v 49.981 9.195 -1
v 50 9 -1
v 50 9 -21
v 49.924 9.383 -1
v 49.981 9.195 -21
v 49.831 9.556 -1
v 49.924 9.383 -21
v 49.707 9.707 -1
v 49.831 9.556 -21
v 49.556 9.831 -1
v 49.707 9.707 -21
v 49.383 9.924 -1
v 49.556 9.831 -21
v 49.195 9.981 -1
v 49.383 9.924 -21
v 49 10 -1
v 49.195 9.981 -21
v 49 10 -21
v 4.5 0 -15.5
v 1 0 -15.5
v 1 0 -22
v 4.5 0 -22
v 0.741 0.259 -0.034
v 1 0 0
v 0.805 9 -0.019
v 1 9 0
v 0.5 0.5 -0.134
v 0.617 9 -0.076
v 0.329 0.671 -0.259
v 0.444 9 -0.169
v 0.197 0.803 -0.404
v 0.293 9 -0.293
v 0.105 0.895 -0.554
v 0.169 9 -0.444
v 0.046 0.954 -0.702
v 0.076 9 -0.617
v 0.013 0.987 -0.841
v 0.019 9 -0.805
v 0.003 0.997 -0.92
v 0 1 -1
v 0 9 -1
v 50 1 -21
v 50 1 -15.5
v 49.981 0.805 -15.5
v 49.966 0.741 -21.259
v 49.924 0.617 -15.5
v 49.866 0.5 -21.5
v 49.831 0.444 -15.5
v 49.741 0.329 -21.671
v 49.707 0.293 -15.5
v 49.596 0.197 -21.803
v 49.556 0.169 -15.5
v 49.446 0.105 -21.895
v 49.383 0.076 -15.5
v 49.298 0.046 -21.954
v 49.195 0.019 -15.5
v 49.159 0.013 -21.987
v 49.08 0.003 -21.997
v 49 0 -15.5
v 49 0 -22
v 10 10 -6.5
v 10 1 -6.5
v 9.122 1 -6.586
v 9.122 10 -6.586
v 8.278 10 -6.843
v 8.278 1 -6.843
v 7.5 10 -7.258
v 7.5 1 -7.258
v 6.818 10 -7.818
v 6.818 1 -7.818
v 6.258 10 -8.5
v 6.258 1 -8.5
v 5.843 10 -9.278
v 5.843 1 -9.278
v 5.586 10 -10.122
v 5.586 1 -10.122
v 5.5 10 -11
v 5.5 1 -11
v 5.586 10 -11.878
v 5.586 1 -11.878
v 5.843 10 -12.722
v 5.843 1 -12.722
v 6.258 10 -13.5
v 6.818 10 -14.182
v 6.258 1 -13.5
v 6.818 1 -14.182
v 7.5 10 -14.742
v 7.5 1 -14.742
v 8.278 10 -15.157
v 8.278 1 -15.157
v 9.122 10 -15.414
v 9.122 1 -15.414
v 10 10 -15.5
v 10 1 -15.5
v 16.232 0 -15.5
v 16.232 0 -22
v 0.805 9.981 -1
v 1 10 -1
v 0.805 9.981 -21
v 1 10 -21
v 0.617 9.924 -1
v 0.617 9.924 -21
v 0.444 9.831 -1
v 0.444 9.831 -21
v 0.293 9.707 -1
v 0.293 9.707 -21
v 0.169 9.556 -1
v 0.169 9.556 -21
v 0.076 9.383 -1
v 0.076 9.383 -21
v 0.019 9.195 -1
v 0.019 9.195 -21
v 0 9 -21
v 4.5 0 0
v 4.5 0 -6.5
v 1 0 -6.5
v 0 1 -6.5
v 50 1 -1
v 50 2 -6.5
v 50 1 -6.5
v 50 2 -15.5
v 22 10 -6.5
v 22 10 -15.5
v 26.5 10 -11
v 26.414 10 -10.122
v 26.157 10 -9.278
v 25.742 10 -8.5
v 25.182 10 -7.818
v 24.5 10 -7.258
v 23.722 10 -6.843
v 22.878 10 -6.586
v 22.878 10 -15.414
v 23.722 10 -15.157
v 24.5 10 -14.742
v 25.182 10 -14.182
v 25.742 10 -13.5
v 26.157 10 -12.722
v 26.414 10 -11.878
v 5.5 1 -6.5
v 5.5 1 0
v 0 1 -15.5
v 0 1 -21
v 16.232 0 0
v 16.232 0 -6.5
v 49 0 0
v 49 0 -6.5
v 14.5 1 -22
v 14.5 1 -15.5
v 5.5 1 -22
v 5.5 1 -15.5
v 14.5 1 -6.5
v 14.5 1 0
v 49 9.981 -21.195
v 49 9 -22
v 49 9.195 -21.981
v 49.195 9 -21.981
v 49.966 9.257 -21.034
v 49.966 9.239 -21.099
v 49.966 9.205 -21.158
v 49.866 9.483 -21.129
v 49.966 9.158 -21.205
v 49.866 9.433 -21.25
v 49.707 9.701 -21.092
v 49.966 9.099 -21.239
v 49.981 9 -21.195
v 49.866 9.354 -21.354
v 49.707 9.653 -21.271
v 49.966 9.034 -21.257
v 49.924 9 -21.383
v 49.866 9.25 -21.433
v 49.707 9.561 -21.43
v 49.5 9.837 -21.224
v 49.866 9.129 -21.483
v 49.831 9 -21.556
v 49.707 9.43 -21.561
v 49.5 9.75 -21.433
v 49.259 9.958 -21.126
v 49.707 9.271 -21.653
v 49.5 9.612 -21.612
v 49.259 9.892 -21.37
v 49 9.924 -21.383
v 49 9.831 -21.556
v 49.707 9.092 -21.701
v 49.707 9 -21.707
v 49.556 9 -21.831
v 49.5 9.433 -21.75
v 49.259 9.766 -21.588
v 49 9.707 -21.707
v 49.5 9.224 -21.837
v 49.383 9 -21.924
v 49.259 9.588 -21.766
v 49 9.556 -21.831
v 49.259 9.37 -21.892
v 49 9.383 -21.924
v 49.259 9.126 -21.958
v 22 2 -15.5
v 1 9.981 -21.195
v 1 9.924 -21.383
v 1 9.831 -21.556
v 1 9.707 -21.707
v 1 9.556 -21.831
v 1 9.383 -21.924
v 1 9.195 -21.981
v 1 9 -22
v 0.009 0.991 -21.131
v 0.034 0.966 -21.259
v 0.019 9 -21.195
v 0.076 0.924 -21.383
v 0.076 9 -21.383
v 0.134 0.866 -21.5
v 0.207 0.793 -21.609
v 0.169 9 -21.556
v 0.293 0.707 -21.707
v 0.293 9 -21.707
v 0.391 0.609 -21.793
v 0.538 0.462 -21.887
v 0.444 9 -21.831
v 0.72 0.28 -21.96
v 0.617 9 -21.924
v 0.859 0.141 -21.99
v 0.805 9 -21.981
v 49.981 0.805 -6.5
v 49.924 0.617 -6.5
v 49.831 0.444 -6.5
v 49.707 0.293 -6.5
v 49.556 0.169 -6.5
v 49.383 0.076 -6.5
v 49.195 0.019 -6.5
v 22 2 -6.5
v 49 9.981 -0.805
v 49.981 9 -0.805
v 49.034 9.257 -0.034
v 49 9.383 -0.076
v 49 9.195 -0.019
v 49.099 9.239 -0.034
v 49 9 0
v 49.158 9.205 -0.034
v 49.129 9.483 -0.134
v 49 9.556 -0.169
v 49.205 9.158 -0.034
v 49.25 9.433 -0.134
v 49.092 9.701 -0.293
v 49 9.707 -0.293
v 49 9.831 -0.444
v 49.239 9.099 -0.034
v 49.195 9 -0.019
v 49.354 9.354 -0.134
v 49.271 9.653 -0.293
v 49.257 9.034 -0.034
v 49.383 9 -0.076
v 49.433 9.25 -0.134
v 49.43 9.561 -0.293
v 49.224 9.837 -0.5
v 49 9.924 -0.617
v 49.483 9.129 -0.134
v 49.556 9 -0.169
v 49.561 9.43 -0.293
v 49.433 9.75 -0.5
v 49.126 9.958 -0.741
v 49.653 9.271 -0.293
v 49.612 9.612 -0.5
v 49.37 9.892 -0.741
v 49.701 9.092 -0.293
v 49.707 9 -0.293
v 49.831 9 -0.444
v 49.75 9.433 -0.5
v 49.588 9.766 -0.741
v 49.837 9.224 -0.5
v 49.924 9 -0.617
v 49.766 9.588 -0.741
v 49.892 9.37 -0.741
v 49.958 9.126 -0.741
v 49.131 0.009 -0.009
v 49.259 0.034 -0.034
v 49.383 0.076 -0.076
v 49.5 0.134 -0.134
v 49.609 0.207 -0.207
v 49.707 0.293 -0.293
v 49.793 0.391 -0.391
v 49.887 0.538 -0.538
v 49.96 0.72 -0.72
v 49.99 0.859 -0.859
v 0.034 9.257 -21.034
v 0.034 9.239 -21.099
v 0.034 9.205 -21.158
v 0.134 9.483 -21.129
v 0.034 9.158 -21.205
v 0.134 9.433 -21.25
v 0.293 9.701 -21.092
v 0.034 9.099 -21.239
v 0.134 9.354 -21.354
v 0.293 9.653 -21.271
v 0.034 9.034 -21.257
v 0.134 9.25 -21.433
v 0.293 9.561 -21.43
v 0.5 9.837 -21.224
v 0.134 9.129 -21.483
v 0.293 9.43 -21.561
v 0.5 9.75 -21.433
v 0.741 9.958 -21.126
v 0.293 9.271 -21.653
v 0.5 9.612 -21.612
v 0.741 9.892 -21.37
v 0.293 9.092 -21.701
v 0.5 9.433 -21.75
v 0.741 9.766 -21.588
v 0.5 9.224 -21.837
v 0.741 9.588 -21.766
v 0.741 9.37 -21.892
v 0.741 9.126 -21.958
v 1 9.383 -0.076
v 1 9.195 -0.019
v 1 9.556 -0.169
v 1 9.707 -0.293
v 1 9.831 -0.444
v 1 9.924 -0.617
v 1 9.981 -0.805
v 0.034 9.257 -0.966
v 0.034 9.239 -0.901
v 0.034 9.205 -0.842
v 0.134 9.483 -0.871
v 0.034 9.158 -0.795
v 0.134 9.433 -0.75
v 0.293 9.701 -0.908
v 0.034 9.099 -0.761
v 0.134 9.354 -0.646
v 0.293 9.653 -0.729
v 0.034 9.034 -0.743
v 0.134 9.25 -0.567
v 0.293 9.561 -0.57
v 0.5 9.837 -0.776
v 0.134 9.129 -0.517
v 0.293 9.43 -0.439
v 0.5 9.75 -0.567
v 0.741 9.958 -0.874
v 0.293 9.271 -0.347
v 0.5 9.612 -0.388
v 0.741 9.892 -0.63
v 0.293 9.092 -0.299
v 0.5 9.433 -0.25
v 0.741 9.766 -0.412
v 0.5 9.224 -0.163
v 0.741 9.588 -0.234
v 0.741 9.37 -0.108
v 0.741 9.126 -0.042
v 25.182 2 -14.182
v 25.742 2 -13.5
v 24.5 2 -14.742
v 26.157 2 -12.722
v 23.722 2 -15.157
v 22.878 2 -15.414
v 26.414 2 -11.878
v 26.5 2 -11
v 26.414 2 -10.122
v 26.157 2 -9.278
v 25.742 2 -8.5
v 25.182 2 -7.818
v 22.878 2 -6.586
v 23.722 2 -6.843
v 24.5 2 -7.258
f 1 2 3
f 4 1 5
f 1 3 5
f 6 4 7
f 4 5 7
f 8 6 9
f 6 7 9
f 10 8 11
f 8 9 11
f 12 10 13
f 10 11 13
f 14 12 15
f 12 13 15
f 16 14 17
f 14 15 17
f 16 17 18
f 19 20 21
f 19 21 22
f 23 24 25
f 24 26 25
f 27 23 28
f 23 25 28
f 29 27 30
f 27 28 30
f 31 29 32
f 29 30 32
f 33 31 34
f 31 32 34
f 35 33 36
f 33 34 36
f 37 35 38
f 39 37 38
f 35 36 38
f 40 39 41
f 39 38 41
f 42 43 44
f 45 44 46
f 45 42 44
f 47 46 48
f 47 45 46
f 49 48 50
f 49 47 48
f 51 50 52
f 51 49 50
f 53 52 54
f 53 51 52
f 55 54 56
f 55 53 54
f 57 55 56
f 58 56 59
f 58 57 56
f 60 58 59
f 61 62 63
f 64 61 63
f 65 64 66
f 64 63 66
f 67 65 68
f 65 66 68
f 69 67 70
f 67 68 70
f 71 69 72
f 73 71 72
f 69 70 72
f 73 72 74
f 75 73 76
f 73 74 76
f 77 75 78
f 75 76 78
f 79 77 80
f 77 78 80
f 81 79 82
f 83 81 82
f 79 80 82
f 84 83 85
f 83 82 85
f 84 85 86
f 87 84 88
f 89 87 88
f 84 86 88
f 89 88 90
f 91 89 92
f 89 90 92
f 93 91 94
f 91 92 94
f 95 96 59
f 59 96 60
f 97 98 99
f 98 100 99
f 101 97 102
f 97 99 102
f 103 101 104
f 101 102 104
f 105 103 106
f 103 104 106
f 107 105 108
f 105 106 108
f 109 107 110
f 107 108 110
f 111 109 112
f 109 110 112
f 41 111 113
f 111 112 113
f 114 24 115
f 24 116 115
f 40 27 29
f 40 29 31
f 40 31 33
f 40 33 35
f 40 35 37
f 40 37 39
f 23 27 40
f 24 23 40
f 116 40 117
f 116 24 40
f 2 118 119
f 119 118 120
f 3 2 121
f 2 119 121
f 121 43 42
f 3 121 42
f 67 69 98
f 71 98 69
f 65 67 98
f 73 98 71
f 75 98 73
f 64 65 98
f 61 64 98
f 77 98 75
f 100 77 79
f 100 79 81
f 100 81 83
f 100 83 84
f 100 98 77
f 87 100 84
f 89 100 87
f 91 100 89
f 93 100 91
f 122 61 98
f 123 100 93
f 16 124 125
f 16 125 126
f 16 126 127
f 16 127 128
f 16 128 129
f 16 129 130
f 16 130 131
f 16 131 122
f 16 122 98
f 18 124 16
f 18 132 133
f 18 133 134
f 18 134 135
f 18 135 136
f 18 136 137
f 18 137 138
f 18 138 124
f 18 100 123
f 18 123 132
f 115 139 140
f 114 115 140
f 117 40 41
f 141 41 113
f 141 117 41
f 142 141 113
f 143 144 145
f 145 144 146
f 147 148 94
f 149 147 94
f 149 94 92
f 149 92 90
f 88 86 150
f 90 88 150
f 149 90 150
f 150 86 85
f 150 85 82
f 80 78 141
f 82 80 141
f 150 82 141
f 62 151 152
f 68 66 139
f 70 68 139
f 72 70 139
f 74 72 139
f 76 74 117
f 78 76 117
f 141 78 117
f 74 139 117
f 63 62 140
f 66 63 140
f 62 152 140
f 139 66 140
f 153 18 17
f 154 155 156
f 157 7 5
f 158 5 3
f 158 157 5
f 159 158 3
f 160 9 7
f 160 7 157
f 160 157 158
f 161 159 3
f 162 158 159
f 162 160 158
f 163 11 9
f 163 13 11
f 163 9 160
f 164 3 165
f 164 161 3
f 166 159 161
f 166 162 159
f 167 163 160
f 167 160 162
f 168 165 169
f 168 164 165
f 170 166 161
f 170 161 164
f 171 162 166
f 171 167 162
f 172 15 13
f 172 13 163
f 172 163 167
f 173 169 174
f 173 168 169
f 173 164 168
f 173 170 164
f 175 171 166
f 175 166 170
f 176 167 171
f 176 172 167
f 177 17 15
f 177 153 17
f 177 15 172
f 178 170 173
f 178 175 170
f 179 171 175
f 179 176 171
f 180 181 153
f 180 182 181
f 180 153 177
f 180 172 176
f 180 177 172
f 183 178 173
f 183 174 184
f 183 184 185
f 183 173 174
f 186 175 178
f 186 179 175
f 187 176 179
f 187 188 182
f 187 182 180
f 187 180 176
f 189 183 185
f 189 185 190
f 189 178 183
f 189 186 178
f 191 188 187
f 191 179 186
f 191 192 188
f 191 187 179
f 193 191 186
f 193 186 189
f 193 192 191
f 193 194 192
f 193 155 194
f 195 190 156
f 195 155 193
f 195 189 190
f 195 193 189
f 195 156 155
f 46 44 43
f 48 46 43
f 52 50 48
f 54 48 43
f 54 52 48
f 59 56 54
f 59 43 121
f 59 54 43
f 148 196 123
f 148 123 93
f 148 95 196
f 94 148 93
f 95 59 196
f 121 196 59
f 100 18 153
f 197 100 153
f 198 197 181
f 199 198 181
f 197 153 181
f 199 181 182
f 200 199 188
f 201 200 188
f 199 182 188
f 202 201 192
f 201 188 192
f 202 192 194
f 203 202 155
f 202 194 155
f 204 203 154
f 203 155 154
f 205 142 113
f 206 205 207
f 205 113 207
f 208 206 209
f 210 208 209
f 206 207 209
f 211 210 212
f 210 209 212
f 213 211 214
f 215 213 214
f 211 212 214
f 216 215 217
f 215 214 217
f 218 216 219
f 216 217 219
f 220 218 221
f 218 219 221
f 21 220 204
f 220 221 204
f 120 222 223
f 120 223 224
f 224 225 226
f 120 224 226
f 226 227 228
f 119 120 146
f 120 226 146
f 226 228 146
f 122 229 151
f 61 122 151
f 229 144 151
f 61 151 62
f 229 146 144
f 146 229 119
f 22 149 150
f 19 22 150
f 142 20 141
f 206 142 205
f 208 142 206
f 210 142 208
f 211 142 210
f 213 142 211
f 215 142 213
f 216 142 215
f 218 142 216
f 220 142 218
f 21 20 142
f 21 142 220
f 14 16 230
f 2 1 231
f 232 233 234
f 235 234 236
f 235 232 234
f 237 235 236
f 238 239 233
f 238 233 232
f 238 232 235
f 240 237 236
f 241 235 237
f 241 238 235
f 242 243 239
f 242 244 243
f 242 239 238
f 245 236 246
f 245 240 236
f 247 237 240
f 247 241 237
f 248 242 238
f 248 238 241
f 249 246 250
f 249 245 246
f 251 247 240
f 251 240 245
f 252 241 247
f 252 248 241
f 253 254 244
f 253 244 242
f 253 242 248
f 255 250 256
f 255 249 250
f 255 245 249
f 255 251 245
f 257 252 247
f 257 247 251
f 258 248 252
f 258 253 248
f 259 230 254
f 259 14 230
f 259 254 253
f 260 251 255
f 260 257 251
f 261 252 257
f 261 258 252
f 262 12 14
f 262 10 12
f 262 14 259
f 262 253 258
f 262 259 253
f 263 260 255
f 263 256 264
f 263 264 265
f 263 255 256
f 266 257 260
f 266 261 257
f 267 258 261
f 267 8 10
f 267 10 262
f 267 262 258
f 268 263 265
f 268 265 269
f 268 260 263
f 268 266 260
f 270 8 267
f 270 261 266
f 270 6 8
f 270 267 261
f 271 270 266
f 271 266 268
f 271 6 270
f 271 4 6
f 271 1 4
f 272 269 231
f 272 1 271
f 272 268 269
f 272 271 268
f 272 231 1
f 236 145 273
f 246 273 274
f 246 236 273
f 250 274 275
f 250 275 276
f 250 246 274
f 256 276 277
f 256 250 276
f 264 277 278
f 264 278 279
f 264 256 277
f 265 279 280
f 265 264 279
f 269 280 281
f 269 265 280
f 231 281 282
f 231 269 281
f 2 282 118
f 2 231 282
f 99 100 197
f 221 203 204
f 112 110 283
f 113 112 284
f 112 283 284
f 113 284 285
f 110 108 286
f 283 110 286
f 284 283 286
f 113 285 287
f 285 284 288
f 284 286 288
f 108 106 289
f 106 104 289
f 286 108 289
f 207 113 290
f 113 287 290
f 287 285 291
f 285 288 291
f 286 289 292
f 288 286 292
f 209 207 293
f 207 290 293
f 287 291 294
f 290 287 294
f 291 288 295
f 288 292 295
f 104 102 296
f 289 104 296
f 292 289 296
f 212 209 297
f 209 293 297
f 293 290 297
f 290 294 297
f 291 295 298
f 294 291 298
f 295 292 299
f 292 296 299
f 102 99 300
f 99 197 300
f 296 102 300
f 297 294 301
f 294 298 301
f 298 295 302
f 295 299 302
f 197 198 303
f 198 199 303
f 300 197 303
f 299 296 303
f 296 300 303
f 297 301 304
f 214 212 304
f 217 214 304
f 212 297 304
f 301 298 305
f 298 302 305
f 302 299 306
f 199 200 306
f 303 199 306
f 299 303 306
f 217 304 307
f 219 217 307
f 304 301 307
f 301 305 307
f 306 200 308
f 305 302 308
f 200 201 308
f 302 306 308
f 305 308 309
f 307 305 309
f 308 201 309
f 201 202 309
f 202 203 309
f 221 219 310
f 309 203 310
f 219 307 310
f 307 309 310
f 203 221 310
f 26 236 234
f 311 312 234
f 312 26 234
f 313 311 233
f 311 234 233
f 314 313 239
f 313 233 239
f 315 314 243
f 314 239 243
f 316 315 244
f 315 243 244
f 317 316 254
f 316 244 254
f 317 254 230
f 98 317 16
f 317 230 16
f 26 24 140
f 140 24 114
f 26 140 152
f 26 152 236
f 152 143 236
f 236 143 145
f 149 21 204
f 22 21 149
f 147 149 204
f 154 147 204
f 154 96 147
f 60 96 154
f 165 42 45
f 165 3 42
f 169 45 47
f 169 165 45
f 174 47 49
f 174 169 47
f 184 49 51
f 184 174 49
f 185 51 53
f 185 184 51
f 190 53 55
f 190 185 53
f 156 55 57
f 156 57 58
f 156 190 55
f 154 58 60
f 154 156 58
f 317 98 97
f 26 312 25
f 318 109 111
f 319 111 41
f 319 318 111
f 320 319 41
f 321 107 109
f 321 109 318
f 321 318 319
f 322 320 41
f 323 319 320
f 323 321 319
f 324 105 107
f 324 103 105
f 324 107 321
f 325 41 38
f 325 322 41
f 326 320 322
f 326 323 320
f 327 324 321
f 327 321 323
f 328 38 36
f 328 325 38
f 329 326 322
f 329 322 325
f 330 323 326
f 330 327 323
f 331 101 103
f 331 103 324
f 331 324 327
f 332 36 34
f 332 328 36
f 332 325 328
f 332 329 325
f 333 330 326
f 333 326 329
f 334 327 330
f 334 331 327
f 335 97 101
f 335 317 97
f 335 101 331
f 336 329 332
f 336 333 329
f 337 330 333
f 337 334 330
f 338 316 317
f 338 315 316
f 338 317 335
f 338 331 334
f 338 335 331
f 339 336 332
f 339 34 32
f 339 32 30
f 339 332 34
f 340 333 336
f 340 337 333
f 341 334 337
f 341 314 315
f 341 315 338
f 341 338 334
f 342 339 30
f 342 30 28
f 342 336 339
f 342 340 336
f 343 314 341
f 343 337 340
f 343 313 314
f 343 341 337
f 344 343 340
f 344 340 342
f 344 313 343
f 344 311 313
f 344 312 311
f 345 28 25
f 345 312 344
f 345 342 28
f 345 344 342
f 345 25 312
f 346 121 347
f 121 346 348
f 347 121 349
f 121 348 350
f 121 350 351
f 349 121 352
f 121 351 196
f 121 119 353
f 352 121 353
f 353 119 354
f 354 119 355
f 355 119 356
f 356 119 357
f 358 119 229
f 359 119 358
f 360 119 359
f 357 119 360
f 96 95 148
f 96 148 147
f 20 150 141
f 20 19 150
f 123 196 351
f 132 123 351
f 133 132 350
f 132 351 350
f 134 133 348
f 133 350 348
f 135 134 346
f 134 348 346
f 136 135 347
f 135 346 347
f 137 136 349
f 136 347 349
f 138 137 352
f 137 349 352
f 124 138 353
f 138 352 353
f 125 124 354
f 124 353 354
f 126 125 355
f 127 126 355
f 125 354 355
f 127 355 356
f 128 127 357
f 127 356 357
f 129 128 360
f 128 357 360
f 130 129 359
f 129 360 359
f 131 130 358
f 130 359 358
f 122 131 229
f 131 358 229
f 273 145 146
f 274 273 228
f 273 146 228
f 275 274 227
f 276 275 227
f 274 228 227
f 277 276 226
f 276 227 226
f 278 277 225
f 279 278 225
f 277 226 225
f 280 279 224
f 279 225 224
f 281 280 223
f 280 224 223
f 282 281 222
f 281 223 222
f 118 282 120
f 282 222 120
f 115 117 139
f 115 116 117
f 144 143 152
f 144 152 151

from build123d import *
from OCP.BRepFilletAPI import BRepFilletAPI_MakeChamfer

# Parameters (mm, degrees)
SKETCH_1_W          = 50
SKETCH_1_H          = 22
EXTRUDE_1_DEPTH     = 10
CUT_EXTRUDE_1_DEPTH = 2
CUT_EXTRUDE_2_DEPTH = 1
CHAMFER_1_SIZE      = 1
CHAMFER_2_SIZE      = 1
CHAMFER_2_SIZE_2    = 1.732050808
FILLET_1_R          = 1


with BuildPart() as part:
    # 草图1 → 凸台-拉伸1 (new body)
    with BuildSketch(Plane(origin=(0, 0, 0), x_dir=(1, 0, 0), z_dir=(0, 1, 0))):
        with Locations((25, 11)):
            Rectangle(SKETCH_1_W, SKETCH_1_H)
        with BuildLine():
            Line((22, 6.5), (10, 6.5))
            ThreePointArc((10, 6.5), (5.5, 11), (10, 15.5))
            Line((10, 15.5), (22, 15.5))
            ThreePointArc((22, 15.5), (26.5, 11), (22, 6.5))
        make_face(mode=Mode.SUBTRACT)
    extrude(amount=EXTRUDE_1_DEPTH)

    # 草图2 → 切除-拉伸1 (cut)
    with BuildSketch(Plane.XZ):
        with BuildLine():
            Line((50, -6.5), (50, -15.5))
            Line((50, -15.5), (10, -15.5))
            ThreePointArc((10, -15.5), (5.5, -11), (10, -6.5))
            Line((10, -6.5), (50, -6.5))
        make_face()
    extrude(amount=-CUT_EXTRUDE_1_DEPTH, mode=Mode.SUBTRACT)

    # 草图3 → 切除-拉伸2 (cut)
    with BuildSketch(Plane.XZ):
        Polygon((0, -6.5), (5.5, -6.5), (5.5, 0), (14.5, 0), (14.5, -22), (5.5, -22), (5.5, -15.5), (0, -15.5), align=None)
    extrude(amount=-CUT_EXTRUDE_2_DEPTH, mode=Mode.SUBTRACT)

    # 倒角1
    chamfer_1_edges = [part.edges().sort_by_distance(p)[0] for p in [
        (0, 0, -18.75),
        (5.5, 0, -18.75),
        (5.5, 0, -3.25),
        (0, 0, -3.25),
    ]]
    chamfer(chamfer_1_edges, length=CHAMFER_1_SIZE - 0.0001)  # a hair under: the kernel refuses the full size

    # 倒角2
    chamfer_2_edges_1 = [part.edges().sort_by_distance(p)[0] for p in [
        (14.5, 0, -18.75),
    ]]
    chamfer_2_side_1 = [part.faces().sort_by_distance(p)[0] for p in [
        (14.5, 0.02, -18.75),
    ]]
    chamfer_2_edges_2 = [part.edges().sort_by_distance(p)[0] for p in [
        (14.5, 0, -3.25),
    ]]
    chamfer_2_side_2 = [part.faces().sort_by_distance(p)[0] for p in [
        (14.5, 0.02, -3.25),
    ]]
    chamfer_2 = BRepFilletAPI_MakeChamfer(part.part.solid().wrapped)
    for e in chamfer_2_edges_1:
        chamfer_2.Add(CHAMFER_2_SIZE - 0.0001, CHAMFER_2_SIZE_2 - 0.0001, e.wrapped, chamfer_2_side_1[0].wrapped)
    for e in chamfer_2_edges_2:
        chamfer_2.Add(CHAMFER_2_SIZE - 0.0001, CHAMFER_2_SIZE_2 - 0.0001, e.wrapped, chamfer_2_side_2[0].wrapped)
    add(Compound.cast(chamfer_2.Shape()), mode=Mode.REPLACE)  # a hair under: the kernel refuses the full size

    # 圆角1
    fillet_1_edges = [part.edges().sort_by_distance(p)[0] for p in [
        (25, 10, -22),
        (50, 10, -11),
        (25, 10, 0),
        (0, 10, -11),
        (50, 5, 0),
        (50, 5, -22),
        (0, 5.49995, -22),
        (0, 5.49995, 0),
        (50, 0, -18.75),
        (50, 0, -3.25),
    ]]
    fillet(fillet_1_edges, radius=FILLET_1_R)


solid = part.part
